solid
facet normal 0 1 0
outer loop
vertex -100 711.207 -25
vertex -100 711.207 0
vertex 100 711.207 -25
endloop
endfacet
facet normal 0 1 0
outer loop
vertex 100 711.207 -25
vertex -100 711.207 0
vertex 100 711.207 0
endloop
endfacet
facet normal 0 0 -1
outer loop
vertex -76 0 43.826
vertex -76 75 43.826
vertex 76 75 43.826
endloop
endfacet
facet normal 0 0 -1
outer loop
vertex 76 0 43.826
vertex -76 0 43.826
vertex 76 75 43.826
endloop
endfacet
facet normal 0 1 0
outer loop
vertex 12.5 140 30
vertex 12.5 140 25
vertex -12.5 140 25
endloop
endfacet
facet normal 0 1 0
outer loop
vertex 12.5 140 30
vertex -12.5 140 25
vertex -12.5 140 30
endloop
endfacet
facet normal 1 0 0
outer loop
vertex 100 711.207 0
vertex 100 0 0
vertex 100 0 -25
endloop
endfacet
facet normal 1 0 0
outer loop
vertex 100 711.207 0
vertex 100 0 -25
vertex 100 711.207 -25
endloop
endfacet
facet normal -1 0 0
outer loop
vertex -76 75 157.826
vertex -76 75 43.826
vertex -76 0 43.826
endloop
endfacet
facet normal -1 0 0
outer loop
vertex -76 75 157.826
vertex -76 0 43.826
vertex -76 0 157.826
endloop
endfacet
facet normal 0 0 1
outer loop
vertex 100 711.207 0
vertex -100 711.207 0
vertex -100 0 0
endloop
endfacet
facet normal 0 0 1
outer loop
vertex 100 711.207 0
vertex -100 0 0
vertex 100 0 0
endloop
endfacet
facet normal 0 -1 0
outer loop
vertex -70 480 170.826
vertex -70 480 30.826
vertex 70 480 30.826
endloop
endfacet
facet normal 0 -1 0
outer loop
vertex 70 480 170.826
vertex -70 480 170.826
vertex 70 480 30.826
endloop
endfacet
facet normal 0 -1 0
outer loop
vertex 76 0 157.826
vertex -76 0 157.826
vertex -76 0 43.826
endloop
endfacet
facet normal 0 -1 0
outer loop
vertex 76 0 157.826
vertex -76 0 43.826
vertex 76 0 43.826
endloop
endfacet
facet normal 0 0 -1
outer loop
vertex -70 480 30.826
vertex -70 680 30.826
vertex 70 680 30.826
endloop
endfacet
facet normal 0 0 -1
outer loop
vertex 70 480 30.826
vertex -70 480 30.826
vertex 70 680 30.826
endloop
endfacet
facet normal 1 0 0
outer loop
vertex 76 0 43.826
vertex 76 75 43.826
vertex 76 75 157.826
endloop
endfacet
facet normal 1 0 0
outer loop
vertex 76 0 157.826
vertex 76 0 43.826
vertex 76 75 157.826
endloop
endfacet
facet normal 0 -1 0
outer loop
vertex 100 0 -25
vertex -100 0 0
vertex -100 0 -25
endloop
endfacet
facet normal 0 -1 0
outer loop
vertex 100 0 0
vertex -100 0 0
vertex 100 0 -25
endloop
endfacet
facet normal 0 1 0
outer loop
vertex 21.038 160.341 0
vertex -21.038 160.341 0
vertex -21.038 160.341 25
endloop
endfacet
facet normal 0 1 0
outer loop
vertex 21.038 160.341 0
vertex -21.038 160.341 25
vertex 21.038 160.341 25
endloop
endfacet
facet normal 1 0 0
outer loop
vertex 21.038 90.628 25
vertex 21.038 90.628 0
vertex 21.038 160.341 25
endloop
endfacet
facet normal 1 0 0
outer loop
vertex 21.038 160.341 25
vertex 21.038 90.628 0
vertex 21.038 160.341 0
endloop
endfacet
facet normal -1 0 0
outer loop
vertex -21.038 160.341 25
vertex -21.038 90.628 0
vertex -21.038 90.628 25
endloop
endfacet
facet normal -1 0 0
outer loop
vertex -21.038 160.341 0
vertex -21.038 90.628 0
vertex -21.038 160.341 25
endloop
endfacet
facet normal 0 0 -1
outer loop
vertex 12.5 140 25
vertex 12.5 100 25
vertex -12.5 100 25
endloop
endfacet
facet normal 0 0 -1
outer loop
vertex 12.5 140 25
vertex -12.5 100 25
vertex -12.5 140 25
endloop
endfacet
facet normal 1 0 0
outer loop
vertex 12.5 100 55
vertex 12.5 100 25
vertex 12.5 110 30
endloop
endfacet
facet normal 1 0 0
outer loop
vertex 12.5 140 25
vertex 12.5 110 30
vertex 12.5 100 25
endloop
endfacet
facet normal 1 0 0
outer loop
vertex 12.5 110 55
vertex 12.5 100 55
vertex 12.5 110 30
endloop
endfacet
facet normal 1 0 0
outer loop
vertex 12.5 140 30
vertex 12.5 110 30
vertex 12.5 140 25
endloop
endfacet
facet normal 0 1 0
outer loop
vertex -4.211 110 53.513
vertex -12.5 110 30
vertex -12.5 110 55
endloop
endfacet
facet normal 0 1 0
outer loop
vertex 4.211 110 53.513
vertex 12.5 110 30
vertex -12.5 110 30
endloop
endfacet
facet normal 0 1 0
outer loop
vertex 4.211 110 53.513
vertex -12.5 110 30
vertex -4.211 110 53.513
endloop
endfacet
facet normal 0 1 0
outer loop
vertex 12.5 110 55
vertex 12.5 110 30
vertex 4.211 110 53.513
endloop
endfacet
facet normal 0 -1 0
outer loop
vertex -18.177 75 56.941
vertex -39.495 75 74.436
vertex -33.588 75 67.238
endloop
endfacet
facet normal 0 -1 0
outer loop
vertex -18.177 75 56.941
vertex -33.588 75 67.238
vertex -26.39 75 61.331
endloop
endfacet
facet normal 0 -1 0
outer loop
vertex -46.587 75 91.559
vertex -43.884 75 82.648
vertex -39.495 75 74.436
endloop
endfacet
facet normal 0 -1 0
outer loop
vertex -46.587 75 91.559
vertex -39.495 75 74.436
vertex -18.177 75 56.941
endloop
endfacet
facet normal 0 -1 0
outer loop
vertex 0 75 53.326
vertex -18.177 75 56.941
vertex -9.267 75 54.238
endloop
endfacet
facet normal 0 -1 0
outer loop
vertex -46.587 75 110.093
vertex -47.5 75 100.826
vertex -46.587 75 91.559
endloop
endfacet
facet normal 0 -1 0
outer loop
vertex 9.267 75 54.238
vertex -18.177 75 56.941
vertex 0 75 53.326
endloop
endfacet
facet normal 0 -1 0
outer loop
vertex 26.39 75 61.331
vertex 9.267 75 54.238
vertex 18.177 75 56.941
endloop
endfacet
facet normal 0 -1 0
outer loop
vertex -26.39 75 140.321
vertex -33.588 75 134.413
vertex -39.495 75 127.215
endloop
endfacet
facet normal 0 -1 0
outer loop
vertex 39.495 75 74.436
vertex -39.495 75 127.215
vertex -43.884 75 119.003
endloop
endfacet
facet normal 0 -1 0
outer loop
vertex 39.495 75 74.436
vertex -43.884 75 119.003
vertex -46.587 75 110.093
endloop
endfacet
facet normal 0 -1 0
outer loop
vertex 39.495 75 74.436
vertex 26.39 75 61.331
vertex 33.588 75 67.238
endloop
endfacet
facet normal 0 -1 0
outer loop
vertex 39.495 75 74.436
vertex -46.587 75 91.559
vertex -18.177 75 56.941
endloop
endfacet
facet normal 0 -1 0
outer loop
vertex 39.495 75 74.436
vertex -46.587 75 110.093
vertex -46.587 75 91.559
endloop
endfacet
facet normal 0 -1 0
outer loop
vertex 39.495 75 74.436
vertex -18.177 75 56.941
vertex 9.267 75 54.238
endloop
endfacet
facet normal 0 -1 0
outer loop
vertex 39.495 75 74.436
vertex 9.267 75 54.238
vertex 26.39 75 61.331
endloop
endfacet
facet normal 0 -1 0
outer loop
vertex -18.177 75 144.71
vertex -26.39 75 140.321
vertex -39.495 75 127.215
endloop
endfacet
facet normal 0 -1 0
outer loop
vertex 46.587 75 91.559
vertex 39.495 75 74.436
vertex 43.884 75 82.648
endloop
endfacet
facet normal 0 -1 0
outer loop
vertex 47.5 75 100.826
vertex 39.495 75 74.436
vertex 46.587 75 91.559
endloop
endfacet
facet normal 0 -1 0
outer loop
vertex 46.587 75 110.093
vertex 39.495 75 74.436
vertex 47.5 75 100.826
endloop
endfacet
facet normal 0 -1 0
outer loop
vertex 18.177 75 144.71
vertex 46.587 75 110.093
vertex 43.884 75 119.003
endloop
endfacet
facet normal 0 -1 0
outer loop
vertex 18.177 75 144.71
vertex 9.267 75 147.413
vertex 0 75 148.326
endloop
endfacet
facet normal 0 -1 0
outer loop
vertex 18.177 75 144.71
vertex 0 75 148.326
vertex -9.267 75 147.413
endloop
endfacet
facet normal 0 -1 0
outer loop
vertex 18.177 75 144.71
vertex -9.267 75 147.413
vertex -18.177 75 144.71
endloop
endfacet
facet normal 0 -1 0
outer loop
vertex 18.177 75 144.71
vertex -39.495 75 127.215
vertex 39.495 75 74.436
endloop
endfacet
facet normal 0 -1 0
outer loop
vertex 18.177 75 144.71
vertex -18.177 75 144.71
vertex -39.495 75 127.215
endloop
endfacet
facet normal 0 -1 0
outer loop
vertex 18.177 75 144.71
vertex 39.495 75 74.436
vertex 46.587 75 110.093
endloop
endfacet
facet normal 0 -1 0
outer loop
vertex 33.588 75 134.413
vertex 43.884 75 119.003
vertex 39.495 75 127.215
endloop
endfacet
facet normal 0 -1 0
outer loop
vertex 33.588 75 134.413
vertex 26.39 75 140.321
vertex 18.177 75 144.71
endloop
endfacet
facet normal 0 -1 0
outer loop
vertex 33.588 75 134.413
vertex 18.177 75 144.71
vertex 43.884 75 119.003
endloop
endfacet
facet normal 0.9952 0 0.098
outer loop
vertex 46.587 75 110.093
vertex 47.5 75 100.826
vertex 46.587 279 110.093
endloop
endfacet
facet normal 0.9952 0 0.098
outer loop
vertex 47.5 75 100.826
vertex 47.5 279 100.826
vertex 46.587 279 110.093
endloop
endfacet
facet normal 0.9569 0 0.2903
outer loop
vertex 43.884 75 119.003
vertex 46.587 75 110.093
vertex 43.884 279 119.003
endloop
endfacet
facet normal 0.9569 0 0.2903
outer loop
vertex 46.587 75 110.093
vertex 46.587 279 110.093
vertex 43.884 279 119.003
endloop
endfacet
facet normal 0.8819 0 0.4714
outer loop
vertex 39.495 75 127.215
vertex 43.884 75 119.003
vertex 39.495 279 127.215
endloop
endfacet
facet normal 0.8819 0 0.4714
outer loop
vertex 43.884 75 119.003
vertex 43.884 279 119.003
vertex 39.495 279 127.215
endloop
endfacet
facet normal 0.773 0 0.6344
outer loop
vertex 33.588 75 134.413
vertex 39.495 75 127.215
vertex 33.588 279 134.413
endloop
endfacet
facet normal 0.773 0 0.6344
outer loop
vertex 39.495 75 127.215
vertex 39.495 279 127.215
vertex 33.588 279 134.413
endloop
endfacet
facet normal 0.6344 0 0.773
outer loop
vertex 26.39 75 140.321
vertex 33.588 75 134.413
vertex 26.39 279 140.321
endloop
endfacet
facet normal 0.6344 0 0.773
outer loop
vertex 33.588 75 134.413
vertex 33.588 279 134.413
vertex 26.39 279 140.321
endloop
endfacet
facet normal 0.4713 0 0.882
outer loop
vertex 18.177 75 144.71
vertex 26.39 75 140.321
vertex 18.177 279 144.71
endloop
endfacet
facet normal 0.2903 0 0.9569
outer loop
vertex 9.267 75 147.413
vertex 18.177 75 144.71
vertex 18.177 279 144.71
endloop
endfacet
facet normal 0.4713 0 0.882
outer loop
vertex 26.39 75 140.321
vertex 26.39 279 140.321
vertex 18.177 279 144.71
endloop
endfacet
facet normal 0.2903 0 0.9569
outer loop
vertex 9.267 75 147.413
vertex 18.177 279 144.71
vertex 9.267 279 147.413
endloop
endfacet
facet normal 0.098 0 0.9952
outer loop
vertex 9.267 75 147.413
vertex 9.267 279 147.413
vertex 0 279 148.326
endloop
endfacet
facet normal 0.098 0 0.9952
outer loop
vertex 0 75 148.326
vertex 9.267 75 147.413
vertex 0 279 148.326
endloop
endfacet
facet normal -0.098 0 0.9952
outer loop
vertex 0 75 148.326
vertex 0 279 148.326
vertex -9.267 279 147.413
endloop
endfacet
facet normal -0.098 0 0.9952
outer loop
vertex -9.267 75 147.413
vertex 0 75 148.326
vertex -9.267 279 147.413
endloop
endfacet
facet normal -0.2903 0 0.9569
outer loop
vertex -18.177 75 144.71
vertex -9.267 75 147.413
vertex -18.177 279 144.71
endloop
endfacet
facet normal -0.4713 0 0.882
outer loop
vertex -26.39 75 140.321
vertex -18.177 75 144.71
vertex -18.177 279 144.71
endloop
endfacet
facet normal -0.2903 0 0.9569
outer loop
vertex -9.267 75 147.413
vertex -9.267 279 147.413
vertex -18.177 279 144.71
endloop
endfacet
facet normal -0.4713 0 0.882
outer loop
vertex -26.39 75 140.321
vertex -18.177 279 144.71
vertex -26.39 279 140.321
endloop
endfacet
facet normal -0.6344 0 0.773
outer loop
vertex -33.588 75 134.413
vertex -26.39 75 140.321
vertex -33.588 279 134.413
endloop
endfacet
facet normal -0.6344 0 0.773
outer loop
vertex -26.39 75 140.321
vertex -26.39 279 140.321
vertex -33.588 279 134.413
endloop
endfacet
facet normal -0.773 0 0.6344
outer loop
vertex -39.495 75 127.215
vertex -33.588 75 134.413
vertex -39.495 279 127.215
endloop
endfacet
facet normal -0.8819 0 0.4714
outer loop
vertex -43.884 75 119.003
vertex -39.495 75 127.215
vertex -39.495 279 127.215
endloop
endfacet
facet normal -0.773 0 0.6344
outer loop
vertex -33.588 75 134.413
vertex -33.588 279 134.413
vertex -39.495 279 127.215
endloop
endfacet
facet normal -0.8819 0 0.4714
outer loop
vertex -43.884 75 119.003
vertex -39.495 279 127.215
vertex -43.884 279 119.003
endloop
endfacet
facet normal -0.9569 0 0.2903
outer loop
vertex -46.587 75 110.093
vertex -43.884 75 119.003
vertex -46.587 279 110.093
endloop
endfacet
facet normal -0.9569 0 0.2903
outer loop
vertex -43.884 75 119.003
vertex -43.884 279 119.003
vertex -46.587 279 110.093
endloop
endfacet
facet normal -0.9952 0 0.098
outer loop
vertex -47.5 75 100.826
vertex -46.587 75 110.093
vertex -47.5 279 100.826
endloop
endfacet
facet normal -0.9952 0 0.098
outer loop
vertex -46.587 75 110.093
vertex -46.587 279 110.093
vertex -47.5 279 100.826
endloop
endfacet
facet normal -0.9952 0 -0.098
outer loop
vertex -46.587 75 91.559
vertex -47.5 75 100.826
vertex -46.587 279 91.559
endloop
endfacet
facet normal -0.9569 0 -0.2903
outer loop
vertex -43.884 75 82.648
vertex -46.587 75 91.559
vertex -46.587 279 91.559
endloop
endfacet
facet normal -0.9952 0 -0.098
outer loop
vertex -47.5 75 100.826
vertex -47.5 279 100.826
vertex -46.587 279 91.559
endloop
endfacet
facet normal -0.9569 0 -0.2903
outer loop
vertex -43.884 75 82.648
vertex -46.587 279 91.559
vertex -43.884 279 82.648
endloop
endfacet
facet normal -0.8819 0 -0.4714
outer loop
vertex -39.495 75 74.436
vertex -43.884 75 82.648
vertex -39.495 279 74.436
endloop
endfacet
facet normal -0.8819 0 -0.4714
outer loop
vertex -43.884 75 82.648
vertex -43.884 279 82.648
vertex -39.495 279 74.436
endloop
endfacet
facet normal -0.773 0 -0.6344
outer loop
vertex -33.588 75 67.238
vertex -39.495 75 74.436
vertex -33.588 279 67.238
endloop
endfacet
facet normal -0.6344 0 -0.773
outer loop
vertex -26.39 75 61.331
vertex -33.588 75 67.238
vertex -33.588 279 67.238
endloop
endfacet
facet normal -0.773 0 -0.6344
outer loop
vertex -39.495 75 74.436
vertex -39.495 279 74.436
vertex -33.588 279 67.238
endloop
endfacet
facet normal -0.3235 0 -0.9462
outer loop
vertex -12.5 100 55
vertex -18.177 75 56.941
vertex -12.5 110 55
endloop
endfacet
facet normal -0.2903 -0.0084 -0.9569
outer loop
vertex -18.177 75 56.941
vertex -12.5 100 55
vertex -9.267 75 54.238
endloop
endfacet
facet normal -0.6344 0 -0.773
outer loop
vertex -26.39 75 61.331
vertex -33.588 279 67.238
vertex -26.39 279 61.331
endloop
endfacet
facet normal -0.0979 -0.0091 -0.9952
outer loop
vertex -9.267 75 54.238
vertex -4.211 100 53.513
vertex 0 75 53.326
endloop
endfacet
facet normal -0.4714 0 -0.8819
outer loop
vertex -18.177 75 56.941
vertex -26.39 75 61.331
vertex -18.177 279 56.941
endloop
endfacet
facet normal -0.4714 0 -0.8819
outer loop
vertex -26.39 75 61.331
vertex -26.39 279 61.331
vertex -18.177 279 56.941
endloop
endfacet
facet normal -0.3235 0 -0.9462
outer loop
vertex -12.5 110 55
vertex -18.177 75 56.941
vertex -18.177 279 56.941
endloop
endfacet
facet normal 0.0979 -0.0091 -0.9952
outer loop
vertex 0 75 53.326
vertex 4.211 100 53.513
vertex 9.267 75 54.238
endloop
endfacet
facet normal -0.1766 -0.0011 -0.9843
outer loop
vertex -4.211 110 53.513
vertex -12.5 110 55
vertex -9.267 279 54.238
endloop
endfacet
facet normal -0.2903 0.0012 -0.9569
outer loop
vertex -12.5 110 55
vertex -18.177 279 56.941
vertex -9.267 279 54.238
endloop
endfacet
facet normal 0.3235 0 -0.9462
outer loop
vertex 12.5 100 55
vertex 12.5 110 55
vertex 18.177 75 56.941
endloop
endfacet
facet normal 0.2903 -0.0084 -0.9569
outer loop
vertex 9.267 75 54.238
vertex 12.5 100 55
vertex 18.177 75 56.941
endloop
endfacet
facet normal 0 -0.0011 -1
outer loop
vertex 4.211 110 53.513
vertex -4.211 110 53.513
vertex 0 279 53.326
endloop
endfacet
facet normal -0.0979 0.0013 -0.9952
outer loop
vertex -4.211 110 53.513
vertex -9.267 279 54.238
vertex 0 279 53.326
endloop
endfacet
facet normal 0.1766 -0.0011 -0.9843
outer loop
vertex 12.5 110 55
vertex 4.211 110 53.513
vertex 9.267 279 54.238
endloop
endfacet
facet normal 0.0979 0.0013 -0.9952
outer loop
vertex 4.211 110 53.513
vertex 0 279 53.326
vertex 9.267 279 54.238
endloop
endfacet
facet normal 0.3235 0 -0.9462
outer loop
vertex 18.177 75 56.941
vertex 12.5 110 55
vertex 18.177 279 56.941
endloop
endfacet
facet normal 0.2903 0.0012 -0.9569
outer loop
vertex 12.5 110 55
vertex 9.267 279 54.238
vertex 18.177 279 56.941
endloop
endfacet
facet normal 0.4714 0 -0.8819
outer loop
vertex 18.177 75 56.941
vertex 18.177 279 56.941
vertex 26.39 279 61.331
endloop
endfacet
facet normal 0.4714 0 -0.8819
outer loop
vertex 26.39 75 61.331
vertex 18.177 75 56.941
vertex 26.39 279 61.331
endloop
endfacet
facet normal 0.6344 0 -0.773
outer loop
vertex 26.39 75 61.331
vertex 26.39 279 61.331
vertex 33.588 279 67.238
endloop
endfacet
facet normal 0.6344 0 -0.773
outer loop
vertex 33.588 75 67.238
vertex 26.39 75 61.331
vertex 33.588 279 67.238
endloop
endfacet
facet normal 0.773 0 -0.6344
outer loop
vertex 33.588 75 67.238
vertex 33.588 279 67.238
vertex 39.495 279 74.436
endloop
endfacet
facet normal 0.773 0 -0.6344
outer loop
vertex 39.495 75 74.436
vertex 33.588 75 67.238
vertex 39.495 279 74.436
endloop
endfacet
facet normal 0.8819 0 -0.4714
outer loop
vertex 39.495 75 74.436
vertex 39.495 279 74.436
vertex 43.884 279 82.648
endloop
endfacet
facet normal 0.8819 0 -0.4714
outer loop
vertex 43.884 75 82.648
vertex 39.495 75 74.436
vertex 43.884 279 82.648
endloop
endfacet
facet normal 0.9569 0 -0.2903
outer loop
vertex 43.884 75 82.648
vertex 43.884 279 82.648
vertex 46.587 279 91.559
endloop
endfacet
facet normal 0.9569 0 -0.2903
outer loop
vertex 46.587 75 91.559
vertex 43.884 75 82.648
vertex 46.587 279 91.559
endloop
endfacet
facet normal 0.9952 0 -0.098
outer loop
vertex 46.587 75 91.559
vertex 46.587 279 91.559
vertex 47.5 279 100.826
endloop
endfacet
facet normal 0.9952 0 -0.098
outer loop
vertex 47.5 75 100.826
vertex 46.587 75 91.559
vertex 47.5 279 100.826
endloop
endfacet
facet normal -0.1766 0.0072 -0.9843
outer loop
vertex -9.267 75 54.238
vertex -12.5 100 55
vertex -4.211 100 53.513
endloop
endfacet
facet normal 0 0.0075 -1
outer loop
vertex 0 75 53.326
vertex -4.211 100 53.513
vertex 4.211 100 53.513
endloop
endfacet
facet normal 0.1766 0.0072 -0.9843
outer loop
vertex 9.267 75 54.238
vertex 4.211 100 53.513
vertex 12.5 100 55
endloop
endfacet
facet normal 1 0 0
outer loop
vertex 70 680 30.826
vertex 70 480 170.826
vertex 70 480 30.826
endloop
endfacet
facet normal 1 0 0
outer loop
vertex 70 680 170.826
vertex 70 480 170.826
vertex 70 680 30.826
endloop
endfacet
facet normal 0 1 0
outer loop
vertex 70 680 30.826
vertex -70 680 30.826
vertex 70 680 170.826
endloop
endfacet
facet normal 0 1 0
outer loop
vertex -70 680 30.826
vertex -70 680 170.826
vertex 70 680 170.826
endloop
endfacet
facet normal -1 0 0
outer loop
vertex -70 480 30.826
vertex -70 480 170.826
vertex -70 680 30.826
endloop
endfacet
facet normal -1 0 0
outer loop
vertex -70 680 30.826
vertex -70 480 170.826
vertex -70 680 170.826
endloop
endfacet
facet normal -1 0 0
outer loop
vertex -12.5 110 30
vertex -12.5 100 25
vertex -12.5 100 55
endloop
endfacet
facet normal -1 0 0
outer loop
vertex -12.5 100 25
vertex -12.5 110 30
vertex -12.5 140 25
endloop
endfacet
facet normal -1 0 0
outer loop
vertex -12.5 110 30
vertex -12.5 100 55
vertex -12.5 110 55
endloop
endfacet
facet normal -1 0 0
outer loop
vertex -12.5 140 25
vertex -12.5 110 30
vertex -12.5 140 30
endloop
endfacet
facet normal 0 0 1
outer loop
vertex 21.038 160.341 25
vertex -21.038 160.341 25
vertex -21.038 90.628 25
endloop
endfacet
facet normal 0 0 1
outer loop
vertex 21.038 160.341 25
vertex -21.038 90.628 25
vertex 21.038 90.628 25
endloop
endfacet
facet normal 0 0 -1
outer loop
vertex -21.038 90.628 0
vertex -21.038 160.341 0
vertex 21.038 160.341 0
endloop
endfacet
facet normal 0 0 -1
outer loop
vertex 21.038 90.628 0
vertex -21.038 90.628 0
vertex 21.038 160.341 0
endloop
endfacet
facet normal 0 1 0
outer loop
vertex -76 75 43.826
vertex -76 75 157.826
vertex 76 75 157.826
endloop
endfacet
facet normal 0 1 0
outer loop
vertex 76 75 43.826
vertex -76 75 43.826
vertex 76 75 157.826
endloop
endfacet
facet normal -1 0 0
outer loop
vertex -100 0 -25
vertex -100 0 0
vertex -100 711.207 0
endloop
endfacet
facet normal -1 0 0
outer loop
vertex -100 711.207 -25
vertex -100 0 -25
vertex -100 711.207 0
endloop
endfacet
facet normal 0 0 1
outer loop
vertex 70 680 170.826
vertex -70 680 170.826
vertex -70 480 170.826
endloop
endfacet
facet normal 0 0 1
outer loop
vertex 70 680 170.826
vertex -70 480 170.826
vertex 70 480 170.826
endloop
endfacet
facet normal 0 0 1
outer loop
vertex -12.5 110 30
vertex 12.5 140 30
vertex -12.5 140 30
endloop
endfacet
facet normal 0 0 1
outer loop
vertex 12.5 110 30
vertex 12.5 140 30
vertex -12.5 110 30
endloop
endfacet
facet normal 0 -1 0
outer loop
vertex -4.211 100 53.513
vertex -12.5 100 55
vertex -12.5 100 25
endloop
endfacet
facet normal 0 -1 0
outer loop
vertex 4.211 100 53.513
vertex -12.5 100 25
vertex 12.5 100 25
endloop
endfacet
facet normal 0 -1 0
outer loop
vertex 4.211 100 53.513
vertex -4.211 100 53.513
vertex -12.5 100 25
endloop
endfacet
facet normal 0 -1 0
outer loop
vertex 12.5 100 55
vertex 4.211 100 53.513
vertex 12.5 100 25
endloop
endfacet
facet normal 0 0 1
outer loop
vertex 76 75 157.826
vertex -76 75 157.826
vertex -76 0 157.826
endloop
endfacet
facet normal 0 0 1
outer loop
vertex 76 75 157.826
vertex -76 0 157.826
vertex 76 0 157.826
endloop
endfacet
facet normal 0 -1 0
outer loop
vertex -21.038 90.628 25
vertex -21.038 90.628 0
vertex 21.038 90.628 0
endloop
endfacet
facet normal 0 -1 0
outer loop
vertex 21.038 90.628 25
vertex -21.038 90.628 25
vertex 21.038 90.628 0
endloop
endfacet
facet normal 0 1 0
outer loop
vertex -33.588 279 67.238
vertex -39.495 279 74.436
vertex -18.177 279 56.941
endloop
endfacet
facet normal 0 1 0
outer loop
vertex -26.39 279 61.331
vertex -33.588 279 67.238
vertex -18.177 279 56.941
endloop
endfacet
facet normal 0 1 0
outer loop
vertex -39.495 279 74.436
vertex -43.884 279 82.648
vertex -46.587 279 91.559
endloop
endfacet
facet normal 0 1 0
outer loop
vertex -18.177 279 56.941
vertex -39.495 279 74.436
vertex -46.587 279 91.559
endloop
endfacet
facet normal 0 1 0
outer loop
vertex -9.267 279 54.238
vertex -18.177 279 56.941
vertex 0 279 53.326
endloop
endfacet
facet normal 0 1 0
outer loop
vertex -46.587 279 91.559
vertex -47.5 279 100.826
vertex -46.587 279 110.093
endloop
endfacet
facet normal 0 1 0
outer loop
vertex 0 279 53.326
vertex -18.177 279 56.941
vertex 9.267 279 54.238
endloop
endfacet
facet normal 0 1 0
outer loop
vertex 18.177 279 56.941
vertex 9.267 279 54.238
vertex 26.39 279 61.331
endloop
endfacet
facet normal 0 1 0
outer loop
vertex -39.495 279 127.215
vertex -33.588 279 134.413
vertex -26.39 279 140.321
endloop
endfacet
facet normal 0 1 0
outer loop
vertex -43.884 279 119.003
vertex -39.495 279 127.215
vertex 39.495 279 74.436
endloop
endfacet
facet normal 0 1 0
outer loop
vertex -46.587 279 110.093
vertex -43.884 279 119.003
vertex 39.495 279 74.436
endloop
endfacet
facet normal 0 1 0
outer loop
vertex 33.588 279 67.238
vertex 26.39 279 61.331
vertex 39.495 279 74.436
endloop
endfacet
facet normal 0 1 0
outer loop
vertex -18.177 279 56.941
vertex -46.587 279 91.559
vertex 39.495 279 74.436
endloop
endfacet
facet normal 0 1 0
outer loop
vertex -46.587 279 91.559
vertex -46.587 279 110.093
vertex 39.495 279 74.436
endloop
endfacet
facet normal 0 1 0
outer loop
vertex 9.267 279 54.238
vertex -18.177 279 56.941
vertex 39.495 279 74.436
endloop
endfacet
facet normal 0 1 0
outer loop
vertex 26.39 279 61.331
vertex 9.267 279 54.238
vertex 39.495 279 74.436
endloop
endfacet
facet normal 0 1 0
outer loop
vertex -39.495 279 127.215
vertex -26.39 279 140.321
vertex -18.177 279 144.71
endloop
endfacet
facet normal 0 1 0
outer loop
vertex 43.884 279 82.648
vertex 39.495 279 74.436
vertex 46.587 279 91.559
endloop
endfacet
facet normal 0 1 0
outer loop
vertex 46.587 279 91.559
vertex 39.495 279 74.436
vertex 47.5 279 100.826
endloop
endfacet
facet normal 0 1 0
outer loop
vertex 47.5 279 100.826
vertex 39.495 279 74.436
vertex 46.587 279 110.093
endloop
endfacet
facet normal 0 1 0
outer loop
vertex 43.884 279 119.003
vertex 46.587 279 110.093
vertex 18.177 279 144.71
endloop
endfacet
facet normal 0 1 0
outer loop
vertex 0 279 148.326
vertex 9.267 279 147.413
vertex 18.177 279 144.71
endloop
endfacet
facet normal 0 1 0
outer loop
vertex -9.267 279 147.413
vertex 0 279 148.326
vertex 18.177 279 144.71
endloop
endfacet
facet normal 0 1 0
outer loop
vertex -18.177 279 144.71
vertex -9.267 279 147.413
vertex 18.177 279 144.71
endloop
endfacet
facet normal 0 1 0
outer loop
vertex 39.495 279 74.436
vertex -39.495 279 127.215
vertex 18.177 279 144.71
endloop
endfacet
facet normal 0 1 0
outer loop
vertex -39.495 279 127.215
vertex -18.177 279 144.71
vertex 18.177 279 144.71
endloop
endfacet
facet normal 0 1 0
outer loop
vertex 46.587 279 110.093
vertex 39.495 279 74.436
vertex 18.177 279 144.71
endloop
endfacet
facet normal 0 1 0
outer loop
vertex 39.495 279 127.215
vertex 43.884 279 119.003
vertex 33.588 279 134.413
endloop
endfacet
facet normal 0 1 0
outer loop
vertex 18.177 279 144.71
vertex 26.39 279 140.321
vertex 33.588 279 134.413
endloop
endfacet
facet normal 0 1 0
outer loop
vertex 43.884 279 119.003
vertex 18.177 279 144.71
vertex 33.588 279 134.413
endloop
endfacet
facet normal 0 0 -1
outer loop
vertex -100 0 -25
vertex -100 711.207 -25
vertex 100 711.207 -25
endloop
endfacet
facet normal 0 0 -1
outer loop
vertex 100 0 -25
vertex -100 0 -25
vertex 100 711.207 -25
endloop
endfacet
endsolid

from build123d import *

# Parameters (mm, degrees)
F0_W          = 200
F0_H          = 711.206817627
F1_DEPTH      = 25
F3_DEPTH      = 12.5
F5_R          = 47.5
F6_DEPTH      = 179
F6_DEPTH_BACK = 25
F7_W          = 152
F7_H          = 114
F8_DEPTH      = 75
F9_W          = 42.0769490302
F9_H          = 69.712638855
F10_DEPTH     = 25
F12_W         = 140
F12_H         = 200
F13_DEPTH     = 70


with BuildPart() as f1:
    # F0 (on Top) → F1 (new body)
    with BuildSketch(Plane.XY):
        with Locations((0, 355.6034088135)):
            Rectangle(F0_W, F0_H)
    extrude(amount=-F1_DEPTH)


with BuildPart() as f3:
    # F2 (on Right) → F3 (new body, symmetric)
    with BuildSketch(Plane.YZ):
        Polygon((100, 55), (100, 25), (140, 25), (140, 30), (110, 30), (110, 55), align=None)
    extrude(amount=F3_DEPTH, both=True)

    # F5 (on offset) → F6 (join, two sides)
    with BuildSketch(Plane.XZ.offset(-100)) as f6_sk:
        with Locations((0, 100.8257569496)):
            Circle(F5_R)
    extrude(amount=-F6_DEPTH)
    extrude(f6_sk.sketch, amount=F6_DEPTH_BACK)


with BuildPart() as f8:
    # F7 (on face) → F8 (new body)
    with BuildSketch(Plane.XZ.offset(-75)):
        with Locations((0, 100.8257569496)):
            Rectangle(F7_W, F7_H)
    extrude(amount=F8_DEPTH)


with BuildPart() as f10:
    # F9 (on face) → F10 (new body, through all)
    with BuildSketch(Plane.XY):
        with Locations((0, 125.4847198725)):
            Rectangle(F9_W, F9_H)
    extrude(amount=F10_DEPTH)


with BuildPart() as f13:
    # F12 (on mid) → F13 (new body, symmetric)
    with BuildSketch(Plane.XY.offset(100.8257569496)):
        with Locations((0, 580)):
            Rectangle(F12_W, F12_H)
    extrude(amount=F13_DEPTH, both=True)


solid = Compound([f1.part, f3.part, f8.part, f10.part, f13.part])
